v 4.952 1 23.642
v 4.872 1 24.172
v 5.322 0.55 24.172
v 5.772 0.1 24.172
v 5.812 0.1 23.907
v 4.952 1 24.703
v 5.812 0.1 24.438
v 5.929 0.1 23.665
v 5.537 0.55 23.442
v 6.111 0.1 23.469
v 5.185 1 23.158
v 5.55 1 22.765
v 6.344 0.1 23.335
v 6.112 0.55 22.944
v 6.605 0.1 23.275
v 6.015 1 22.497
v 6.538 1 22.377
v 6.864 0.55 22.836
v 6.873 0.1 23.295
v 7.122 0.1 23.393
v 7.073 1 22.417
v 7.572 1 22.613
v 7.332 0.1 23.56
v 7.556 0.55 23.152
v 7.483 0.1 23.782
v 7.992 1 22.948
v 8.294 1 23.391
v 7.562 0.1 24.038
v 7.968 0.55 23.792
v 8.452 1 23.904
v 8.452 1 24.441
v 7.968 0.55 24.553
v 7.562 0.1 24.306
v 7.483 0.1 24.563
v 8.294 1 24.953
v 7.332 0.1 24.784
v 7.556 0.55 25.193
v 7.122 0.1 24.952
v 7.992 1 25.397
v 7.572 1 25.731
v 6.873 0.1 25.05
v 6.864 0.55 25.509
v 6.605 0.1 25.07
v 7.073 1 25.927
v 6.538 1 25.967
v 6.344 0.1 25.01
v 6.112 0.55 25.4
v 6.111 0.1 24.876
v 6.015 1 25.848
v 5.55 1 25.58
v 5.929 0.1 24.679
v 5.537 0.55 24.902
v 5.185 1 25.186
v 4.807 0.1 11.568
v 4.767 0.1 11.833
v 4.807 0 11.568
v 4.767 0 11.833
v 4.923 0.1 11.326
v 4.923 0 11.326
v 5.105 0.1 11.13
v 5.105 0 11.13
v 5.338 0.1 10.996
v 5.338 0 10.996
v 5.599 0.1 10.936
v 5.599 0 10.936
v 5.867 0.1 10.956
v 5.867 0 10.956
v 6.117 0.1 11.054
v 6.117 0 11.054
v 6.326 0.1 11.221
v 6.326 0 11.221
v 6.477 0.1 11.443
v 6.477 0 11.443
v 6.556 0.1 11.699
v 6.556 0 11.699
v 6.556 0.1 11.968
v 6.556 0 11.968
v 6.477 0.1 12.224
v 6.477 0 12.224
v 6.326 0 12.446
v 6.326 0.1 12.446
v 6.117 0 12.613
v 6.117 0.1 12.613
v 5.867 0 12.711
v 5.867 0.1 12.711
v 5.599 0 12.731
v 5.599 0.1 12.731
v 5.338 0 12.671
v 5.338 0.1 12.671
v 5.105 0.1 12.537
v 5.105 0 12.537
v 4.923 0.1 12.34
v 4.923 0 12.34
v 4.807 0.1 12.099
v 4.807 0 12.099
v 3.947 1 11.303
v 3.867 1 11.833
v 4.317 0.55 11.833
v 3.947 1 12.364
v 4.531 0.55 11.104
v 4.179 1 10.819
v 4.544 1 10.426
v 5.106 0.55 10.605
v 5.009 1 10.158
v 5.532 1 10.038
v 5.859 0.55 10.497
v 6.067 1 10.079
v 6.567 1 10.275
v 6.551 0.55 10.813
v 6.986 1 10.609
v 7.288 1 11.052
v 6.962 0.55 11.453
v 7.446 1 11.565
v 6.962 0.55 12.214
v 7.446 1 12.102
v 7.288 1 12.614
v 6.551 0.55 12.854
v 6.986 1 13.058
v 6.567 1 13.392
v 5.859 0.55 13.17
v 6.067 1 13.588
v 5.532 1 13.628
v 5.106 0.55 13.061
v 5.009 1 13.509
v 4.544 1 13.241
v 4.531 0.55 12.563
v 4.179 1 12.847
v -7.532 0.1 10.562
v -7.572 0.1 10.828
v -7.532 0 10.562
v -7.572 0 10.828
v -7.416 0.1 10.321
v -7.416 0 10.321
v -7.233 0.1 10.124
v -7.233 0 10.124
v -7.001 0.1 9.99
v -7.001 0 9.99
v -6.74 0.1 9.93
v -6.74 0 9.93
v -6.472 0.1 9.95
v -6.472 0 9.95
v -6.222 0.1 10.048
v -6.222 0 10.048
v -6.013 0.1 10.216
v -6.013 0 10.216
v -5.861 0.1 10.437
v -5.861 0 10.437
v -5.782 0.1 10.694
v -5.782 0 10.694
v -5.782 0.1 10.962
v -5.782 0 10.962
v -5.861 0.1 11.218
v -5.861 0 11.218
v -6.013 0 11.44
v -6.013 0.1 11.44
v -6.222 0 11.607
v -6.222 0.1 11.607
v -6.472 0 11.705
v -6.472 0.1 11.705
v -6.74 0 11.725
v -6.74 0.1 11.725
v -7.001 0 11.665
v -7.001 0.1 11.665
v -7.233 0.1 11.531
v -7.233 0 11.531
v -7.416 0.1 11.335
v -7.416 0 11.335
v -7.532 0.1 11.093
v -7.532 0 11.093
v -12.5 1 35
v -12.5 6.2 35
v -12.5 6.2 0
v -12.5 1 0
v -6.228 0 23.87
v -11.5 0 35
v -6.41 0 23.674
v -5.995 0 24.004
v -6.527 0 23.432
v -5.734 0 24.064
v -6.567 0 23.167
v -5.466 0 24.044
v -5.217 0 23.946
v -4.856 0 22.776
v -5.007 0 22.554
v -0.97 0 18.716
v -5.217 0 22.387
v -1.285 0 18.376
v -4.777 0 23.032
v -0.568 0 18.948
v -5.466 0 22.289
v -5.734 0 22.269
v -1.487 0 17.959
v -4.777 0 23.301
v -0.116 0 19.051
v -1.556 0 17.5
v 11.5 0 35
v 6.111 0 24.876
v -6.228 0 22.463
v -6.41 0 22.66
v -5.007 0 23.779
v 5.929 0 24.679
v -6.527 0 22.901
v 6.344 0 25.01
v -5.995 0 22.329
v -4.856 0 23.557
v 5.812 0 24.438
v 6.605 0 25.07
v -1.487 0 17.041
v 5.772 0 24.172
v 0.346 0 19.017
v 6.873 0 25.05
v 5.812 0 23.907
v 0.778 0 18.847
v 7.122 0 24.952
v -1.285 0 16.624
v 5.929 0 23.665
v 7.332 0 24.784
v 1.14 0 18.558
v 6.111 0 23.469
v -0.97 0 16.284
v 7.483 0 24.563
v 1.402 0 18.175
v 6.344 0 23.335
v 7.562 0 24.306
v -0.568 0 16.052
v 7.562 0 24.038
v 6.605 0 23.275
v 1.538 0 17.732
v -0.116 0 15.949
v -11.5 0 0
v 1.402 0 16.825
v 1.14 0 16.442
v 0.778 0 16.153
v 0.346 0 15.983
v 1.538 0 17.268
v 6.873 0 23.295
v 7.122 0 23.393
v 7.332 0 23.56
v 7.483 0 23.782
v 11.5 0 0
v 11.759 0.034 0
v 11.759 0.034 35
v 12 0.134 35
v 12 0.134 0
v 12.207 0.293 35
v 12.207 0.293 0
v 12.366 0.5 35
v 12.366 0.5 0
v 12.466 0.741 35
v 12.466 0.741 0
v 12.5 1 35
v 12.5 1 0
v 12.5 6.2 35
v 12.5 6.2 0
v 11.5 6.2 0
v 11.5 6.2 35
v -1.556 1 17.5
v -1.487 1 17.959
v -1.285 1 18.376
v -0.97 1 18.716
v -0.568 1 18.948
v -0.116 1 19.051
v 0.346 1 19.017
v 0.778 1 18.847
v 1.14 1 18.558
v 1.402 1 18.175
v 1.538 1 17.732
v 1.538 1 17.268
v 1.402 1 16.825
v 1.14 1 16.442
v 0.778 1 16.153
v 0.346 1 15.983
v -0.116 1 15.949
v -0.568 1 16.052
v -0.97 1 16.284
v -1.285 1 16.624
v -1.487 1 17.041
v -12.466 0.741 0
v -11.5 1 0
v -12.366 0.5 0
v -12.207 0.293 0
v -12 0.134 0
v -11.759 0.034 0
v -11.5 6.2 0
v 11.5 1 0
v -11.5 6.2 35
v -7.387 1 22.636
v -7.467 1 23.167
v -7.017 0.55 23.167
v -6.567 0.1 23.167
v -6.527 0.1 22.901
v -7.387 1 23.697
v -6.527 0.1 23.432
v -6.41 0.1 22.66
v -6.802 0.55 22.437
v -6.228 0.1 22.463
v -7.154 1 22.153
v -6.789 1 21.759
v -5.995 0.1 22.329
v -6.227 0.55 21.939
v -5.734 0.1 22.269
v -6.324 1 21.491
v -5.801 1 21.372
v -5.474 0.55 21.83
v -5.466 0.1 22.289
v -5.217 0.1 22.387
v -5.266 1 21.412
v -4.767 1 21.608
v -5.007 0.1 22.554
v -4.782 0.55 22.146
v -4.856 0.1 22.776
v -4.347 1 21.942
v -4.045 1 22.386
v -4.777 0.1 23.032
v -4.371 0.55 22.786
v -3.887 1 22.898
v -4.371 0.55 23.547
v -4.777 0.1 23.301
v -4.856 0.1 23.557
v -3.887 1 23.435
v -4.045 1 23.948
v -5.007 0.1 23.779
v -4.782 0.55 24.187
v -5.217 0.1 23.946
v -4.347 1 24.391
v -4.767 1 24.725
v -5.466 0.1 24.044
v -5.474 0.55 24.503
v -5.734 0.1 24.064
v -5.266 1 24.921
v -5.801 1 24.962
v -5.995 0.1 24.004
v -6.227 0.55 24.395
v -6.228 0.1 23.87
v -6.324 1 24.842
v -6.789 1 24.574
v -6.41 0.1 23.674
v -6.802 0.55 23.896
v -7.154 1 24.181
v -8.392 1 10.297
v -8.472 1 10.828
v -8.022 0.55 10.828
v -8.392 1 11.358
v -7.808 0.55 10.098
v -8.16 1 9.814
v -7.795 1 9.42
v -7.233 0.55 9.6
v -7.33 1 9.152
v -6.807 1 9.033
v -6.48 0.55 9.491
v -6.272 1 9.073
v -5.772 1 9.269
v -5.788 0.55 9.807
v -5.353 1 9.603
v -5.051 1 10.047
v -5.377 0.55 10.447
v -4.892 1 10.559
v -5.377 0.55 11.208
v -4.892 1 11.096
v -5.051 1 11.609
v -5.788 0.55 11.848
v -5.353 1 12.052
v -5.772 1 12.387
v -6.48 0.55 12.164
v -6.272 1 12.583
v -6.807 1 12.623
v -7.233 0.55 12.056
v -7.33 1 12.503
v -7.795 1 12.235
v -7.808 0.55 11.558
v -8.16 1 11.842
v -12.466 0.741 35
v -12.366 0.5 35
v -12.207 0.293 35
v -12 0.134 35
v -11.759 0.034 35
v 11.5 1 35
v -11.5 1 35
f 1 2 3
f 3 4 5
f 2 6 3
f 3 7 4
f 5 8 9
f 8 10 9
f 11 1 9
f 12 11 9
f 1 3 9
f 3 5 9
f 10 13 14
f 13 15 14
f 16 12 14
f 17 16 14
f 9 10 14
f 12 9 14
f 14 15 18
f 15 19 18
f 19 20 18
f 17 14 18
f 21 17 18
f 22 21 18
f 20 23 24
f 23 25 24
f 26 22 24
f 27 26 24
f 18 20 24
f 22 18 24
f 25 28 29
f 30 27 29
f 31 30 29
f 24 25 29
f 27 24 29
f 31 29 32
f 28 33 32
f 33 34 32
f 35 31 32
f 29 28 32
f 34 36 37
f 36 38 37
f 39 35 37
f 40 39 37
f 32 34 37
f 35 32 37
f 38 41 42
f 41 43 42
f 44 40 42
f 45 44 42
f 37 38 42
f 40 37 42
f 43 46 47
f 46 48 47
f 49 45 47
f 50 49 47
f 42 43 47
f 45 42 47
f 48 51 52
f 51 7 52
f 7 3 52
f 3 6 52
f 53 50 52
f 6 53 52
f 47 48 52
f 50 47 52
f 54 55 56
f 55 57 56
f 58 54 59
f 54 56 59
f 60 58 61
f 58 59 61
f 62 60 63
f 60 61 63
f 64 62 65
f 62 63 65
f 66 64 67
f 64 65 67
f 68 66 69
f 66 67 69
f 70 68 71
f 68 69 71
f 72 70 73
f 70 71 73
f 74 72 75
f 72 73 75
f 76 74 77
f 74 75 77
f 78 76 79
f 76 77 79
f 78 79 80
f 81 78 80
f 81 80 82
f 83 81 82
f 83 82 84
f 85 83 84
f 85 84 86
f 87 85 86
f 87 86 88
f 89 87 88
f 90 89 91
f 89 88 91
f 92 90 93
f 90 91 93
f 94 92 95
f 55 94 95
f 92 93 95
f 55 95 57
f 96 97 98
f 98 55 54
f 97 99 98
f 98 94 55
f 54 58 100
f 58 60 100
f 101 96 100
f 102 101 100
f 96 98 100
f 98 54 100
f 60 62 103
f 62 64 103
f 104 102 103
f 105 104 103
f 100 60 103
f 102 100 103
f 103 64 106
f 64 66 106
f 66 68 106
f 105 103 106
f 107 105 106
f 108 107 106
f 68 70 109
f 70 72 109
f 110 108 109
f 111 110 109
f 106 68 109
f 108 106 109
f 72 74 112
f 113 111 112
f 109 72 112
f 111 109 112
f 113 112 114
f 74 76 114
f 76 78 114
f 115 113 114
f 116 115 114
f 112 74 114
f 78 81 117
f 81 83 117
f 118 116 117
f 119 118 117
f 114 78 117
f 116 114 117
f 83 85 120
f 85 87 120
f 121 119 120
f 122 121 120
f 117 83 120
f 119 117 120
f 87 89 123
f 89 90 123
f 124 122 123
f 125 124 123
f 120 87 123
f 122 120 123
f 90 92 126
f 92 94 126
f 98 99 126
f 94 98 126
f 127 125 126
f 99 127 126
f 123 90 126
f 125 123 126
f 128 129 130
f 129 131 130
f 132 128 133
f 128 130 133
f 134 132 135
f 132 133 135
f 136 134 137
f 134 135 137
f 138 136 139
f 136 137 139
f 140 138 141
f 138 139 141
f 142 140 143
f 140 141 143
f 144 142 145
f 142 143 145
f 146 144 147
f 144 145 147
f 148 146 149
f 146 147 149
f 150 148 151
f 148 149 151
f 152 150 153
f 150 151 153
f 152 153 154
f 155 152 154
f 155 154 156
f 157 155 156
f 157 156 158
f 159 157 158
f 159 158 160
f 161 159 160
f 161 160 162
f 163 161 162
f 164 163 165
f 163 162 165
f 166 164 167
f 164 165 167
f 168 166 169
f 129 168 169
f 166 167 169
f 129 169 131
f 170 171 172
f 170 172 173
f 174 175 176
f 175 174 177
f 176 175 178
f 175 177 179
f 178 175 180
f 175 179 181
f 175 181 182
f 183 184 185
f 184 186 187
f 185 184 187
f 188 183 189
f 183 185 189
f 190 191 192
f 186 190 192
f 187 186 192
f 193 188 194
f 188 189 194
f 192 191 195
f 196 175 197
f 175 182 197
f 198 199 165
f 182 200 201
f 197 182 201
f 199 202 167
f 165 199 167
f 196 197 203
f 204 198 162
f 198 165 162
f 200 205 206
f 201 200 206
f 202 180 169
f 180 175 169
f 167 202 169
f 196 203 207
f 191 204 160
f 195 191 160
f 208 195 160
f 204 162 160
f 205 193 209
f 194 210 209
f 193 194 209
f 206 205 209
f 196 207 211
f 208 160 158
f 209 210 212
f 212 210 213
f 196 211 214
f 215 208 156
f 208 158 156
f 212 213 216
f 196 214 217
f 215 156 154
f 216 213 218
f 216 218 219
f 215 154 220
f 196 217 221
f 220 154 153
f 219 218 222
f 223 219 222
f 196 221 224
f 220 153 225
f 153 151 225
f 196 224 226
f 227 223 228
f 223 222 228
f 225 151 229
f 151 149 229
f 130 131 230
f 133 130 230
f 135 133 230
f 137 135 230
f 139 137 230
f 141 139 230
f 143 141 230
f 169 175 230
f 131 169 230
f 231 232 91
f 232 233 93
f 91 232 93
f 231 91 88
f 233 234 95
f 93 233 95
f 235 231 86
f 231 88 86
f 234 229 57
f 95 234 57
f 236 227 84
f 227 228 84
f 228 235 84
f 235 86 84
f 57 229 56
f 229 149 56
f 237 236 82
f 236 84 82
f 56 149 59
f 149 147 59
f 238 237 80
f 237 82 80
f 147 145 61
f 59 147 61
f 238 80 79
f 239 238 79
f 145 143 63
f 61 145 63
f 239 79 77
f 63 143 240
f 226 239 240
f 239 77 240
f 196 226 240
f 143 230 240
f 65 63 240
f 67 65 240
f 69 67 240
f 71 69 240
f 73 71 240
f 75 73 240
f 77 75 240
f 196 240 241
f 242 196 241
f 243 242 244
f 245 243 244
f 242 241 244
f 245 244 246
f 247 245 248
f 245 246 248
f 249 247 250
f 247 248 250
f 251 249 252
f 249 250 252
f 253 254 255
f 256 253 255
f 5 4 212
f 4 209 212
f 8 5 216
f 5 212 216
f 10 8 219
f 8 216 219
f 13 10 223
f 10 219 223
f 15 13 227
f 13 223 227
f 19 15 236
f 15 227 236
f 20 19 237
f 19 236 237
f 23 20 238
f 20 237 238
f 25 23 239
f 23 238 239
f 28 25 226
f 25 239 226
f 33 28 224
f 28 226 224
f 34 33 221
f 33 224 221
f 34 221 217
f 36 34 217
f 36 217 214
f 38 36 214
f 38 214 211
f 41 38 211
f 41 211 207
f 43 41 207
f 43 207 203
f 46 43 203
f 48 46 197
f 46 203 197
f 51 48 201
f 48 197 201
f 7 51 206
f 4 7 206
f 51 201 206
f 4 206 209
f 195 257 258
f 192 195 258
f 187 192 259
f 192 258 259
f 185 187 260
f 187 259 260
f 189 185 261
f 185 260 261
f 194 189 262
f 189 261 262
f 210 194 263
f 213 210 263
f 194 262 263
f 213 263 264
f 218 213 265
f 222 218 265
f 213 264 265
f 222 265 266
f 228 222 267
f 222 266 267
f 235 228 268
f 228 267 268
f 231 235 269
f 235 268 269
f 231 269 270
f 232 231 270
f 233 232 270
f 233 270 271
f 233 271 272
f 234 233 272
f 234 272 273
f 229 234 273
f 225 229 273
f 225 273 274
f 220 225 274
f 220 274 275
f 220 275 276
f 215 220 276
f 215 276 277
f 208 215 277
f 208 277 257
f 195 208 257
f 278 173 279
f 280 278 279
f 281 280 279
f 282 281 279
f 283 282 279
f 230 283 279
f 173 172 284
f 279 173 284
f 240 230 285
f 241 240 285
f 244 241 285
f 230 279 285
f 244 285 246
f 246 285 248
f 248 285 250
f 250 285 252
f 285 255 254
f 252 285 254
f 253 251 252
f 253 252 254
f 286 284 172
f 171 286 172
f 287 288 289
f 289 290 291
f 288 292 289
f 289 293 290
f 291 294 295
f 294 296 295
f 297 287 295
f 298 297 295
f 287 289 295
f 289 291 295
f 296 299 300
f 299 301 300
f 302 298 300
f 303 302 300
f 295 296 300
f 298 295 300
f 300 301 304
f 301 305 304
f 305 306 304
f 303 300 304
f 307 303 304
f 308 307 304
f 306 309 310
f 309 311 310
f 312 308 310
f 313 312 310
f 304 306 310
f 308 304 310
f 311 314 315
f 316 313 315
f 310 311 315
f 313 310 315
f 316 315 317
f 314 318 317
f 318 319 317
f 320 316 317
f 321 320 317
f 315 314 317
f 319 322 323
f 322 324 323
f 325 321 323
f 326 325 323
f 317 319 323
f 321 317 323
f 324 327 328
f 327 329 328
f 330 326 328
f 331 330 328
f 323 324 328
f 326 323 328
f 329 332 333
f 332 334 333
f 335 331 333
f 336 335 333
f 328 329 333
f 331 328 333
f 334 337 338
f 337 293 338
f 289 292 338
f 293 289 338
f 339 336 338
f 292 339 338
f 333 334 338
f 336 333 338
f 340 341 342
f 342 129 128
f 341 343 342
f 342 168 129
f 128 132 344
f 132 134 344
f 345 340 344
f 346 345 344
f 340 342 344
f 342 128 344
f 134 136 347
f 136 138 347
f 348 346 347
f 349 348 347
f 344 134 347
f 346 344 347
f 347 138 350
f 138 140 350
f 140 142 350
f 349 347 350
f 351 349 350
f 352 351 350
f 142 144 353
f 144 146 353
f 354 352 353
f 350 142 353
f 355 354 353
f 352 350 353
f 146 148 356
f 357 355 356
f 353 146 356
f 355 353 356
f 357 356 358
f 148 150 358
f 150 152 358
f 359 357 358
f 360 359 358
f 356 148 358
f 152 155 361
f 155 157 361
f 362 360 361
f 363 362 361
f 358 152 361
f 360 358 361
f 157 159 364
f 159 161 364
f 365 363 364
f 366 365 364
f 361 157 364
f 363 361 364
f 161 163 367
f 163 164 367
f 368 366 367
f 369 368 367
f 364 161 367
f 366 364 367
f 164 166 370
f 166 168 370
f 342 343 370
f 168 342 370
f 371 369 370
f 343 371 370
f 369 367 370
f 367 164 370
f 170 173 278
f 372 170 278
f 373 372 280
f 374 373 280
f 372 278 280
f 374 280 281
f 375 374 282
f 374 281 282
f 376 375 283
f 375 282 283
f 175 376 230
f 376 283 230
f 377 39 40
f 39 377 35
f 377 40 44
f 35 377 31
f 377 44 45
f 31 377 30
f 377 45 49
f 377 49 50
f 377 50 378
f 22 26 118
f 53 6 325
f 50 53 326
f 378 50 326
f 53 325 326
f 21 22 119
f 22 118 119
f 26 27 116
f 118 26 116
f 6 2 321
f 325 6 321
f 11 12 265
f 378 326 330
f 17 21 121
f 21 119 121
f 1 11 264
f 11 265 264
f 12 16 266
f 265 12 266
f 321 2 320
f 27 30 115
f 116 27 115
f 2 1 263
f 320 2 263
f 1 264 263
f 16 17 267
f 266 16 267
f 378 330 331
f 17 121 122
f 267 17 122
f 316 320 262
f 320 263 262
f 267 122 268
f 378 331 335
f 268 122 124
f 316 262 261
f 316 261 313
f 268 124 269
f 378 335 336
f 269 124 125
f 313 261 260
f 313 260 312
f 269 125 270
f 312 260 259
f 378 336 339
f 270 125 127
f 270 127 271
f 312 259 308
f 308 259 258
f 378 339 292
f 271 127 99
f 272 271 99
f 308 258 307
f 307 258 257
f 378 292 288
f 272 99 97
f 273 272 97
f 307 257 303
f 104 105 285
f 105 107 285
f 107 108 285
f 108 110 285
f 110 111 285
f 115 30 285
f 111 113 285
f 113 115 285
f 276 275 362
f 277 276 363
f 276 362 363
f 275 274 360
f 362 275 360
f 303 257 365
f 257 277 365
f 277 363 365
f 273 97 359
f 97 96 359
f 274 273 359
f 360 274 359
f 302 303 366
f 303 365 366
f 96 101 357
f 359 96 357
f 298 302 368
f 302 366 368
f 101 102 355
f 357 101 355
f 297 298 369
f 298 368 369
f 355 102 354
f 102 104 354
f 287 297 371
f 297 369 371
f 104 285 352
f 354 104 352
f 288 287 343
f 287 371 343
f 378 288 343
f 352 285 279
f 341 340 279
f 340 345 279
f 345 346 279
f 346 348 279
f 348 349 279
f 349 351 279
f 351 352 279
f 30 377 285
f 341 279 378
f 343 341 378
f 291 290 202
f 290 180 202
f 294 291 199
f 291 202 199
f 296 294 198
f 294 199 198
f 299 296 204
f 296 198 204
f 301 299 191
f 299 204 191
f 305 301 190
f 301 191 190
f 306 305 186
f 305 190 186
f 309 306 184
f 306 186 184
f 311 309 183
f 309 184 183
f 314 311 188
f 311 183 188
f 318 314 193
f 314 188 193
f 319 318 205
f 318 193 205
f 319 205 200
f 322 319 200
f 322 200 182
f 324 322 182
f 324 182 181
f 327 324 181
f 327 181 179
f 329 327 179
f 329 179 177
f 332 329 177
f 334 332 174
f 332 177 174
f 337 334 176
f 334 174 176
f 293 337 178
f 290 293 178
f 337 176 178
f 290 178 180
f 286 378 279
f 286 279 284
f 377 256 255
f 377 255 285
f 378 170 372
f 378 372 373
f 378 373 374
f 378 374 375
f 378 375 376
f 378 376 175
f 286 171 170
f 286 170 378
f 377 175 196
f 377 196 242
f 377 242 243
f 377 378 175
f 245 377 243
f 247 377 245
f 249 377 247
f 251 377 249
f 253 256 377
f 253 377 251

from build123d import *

# Parameters (mm, degrees)
EXTRUDE_THIN1_DEPTH                                  = 35
CUT_EXTRUDE1_REACH                                   = 39.527
SKETCH2_R                                            = 1.55575
CSK_FOR_M1_6_COUNTERSUNK_FLAT_HEAD_SCREW_D           = 1.8
CSK_FOR_M1_6_COUNTERSUNK_FLAT_HEAD_SCREW_DEPTH       = 119
CSK_FOR_M1_6_COUNTERSUNK_FLAT_HEAD_SCREW_CSINK_D     = 3.6
CSK_FOR_M1_6_COUNTERSUNK_FLAT_HEAD_SCREW_CSINK_ANGLE = 90
CSK_FOR_M1_6_COUNTERSUNK_FLAT_HEAD_SCREW_TIP         = 0.540774557


with BuildPart() as part:
    # Sketch1 → Extrude-Thin1 (new body)
    with BuildSketch(Plane.XY):
        with BuildLine():
            Line((-12.5, 6.2), (-12.5, 1))
            ThreePointArc((-12.5, 1), (-12.207106781, 0.292893219), (-11.5, 0))
            Line((-11.5, 0), (11.5, 0))
            ThreePointArc((11.5, 0), (12.207106781, 0.292893219), (12.5, 1))
            Line((12.5, 1), (12.5, 6.2))
            Line((12.5, 6.2), (11.5, 6.2))
            Line((11.5, 6.2), (11.5, 1))
            Line((11.5, 1), (-11.5, 1))
            Line((-11.5, 1), (-11.5, 6.2))
            Line((-11.5, 6.2), (-12.5, 6.2))
        make_face()
    extrude(amount=EXTRUDE_THIN1_DEPTH)

    # Sketch2 → Cut-Extrude1 (cut, up to next)
    with BuildSketch(Plane(origin=(0, 1, 0), x_dir=(1, 0, 0), z_dir=(0, 1, 0)), mode=Mode.PRIVATE) as cut_extrude1_sk1:
        with Locations(Location((0, -17.5, 0), (0, 0, 180))):
            Circle(SKETCH2_R)
    cut_extrude1_tool1 = extrude(cut_extrude1_sk1.sketch, amount=-CUT_EXTRUDE1_REACH, mode=Mode.PRIVATE) & part.part
    add(cut_extrude1_tool1.solids().sort_by_distance((0, 1, 17.5))[0], mode=Mode.SUBTRACT)

    # CSK for M1.6 Countersunk Flat Head Screw1
    with Locations(Plane(origin=(5.666541612, 1, 11.833458388), x_dir=(1, 0, 0), z_dir=(0, 1, 0))):
        with Locations((0, 0), (1.005788686, -12.33887191), (-11.333083224, -11.333083224), (-12.33887191, 1.005788686)):
            CounterSinkHole(CSK_FOR_M1_6_COUNTERSUNK_FLAT_HEAD_SCREW_D / 2, CSK_FOR_M1_6_COUNTERSUNK_FLAT_HEAD_SCREW_CSINK_D / 2, depth=CSK_FOR_M1_6_COUNTERSUNK_FLAT_HEAD_SCREW_DEPTH, counter_sink_angle=CSK_FOR_M1_6_COUNTERSUNK_FLAT_HEAD_SCREW_CSINK_ANGLE)
            with Locations((0, 0, -(CSK_FOR_M1_6_COUNTERSUNK_FLAT_HEAD_SCREW_DEPTH + CSK_FOR_M1_6_COUNTERSUNK_FLAT_HEAD_SCREW_TIP / 2))):  # 118° drill point
                Cone(0, CSK_FOR_M1_6_COUNTERSUNK_FLAT_HEAD_SCREW_D / 2, CSK_FOR_M1_6_COUNTERSUNK_FLAT_HEAD_SCREW_TIP, mode=Mode.SUBTRACT)


solid = part.part
